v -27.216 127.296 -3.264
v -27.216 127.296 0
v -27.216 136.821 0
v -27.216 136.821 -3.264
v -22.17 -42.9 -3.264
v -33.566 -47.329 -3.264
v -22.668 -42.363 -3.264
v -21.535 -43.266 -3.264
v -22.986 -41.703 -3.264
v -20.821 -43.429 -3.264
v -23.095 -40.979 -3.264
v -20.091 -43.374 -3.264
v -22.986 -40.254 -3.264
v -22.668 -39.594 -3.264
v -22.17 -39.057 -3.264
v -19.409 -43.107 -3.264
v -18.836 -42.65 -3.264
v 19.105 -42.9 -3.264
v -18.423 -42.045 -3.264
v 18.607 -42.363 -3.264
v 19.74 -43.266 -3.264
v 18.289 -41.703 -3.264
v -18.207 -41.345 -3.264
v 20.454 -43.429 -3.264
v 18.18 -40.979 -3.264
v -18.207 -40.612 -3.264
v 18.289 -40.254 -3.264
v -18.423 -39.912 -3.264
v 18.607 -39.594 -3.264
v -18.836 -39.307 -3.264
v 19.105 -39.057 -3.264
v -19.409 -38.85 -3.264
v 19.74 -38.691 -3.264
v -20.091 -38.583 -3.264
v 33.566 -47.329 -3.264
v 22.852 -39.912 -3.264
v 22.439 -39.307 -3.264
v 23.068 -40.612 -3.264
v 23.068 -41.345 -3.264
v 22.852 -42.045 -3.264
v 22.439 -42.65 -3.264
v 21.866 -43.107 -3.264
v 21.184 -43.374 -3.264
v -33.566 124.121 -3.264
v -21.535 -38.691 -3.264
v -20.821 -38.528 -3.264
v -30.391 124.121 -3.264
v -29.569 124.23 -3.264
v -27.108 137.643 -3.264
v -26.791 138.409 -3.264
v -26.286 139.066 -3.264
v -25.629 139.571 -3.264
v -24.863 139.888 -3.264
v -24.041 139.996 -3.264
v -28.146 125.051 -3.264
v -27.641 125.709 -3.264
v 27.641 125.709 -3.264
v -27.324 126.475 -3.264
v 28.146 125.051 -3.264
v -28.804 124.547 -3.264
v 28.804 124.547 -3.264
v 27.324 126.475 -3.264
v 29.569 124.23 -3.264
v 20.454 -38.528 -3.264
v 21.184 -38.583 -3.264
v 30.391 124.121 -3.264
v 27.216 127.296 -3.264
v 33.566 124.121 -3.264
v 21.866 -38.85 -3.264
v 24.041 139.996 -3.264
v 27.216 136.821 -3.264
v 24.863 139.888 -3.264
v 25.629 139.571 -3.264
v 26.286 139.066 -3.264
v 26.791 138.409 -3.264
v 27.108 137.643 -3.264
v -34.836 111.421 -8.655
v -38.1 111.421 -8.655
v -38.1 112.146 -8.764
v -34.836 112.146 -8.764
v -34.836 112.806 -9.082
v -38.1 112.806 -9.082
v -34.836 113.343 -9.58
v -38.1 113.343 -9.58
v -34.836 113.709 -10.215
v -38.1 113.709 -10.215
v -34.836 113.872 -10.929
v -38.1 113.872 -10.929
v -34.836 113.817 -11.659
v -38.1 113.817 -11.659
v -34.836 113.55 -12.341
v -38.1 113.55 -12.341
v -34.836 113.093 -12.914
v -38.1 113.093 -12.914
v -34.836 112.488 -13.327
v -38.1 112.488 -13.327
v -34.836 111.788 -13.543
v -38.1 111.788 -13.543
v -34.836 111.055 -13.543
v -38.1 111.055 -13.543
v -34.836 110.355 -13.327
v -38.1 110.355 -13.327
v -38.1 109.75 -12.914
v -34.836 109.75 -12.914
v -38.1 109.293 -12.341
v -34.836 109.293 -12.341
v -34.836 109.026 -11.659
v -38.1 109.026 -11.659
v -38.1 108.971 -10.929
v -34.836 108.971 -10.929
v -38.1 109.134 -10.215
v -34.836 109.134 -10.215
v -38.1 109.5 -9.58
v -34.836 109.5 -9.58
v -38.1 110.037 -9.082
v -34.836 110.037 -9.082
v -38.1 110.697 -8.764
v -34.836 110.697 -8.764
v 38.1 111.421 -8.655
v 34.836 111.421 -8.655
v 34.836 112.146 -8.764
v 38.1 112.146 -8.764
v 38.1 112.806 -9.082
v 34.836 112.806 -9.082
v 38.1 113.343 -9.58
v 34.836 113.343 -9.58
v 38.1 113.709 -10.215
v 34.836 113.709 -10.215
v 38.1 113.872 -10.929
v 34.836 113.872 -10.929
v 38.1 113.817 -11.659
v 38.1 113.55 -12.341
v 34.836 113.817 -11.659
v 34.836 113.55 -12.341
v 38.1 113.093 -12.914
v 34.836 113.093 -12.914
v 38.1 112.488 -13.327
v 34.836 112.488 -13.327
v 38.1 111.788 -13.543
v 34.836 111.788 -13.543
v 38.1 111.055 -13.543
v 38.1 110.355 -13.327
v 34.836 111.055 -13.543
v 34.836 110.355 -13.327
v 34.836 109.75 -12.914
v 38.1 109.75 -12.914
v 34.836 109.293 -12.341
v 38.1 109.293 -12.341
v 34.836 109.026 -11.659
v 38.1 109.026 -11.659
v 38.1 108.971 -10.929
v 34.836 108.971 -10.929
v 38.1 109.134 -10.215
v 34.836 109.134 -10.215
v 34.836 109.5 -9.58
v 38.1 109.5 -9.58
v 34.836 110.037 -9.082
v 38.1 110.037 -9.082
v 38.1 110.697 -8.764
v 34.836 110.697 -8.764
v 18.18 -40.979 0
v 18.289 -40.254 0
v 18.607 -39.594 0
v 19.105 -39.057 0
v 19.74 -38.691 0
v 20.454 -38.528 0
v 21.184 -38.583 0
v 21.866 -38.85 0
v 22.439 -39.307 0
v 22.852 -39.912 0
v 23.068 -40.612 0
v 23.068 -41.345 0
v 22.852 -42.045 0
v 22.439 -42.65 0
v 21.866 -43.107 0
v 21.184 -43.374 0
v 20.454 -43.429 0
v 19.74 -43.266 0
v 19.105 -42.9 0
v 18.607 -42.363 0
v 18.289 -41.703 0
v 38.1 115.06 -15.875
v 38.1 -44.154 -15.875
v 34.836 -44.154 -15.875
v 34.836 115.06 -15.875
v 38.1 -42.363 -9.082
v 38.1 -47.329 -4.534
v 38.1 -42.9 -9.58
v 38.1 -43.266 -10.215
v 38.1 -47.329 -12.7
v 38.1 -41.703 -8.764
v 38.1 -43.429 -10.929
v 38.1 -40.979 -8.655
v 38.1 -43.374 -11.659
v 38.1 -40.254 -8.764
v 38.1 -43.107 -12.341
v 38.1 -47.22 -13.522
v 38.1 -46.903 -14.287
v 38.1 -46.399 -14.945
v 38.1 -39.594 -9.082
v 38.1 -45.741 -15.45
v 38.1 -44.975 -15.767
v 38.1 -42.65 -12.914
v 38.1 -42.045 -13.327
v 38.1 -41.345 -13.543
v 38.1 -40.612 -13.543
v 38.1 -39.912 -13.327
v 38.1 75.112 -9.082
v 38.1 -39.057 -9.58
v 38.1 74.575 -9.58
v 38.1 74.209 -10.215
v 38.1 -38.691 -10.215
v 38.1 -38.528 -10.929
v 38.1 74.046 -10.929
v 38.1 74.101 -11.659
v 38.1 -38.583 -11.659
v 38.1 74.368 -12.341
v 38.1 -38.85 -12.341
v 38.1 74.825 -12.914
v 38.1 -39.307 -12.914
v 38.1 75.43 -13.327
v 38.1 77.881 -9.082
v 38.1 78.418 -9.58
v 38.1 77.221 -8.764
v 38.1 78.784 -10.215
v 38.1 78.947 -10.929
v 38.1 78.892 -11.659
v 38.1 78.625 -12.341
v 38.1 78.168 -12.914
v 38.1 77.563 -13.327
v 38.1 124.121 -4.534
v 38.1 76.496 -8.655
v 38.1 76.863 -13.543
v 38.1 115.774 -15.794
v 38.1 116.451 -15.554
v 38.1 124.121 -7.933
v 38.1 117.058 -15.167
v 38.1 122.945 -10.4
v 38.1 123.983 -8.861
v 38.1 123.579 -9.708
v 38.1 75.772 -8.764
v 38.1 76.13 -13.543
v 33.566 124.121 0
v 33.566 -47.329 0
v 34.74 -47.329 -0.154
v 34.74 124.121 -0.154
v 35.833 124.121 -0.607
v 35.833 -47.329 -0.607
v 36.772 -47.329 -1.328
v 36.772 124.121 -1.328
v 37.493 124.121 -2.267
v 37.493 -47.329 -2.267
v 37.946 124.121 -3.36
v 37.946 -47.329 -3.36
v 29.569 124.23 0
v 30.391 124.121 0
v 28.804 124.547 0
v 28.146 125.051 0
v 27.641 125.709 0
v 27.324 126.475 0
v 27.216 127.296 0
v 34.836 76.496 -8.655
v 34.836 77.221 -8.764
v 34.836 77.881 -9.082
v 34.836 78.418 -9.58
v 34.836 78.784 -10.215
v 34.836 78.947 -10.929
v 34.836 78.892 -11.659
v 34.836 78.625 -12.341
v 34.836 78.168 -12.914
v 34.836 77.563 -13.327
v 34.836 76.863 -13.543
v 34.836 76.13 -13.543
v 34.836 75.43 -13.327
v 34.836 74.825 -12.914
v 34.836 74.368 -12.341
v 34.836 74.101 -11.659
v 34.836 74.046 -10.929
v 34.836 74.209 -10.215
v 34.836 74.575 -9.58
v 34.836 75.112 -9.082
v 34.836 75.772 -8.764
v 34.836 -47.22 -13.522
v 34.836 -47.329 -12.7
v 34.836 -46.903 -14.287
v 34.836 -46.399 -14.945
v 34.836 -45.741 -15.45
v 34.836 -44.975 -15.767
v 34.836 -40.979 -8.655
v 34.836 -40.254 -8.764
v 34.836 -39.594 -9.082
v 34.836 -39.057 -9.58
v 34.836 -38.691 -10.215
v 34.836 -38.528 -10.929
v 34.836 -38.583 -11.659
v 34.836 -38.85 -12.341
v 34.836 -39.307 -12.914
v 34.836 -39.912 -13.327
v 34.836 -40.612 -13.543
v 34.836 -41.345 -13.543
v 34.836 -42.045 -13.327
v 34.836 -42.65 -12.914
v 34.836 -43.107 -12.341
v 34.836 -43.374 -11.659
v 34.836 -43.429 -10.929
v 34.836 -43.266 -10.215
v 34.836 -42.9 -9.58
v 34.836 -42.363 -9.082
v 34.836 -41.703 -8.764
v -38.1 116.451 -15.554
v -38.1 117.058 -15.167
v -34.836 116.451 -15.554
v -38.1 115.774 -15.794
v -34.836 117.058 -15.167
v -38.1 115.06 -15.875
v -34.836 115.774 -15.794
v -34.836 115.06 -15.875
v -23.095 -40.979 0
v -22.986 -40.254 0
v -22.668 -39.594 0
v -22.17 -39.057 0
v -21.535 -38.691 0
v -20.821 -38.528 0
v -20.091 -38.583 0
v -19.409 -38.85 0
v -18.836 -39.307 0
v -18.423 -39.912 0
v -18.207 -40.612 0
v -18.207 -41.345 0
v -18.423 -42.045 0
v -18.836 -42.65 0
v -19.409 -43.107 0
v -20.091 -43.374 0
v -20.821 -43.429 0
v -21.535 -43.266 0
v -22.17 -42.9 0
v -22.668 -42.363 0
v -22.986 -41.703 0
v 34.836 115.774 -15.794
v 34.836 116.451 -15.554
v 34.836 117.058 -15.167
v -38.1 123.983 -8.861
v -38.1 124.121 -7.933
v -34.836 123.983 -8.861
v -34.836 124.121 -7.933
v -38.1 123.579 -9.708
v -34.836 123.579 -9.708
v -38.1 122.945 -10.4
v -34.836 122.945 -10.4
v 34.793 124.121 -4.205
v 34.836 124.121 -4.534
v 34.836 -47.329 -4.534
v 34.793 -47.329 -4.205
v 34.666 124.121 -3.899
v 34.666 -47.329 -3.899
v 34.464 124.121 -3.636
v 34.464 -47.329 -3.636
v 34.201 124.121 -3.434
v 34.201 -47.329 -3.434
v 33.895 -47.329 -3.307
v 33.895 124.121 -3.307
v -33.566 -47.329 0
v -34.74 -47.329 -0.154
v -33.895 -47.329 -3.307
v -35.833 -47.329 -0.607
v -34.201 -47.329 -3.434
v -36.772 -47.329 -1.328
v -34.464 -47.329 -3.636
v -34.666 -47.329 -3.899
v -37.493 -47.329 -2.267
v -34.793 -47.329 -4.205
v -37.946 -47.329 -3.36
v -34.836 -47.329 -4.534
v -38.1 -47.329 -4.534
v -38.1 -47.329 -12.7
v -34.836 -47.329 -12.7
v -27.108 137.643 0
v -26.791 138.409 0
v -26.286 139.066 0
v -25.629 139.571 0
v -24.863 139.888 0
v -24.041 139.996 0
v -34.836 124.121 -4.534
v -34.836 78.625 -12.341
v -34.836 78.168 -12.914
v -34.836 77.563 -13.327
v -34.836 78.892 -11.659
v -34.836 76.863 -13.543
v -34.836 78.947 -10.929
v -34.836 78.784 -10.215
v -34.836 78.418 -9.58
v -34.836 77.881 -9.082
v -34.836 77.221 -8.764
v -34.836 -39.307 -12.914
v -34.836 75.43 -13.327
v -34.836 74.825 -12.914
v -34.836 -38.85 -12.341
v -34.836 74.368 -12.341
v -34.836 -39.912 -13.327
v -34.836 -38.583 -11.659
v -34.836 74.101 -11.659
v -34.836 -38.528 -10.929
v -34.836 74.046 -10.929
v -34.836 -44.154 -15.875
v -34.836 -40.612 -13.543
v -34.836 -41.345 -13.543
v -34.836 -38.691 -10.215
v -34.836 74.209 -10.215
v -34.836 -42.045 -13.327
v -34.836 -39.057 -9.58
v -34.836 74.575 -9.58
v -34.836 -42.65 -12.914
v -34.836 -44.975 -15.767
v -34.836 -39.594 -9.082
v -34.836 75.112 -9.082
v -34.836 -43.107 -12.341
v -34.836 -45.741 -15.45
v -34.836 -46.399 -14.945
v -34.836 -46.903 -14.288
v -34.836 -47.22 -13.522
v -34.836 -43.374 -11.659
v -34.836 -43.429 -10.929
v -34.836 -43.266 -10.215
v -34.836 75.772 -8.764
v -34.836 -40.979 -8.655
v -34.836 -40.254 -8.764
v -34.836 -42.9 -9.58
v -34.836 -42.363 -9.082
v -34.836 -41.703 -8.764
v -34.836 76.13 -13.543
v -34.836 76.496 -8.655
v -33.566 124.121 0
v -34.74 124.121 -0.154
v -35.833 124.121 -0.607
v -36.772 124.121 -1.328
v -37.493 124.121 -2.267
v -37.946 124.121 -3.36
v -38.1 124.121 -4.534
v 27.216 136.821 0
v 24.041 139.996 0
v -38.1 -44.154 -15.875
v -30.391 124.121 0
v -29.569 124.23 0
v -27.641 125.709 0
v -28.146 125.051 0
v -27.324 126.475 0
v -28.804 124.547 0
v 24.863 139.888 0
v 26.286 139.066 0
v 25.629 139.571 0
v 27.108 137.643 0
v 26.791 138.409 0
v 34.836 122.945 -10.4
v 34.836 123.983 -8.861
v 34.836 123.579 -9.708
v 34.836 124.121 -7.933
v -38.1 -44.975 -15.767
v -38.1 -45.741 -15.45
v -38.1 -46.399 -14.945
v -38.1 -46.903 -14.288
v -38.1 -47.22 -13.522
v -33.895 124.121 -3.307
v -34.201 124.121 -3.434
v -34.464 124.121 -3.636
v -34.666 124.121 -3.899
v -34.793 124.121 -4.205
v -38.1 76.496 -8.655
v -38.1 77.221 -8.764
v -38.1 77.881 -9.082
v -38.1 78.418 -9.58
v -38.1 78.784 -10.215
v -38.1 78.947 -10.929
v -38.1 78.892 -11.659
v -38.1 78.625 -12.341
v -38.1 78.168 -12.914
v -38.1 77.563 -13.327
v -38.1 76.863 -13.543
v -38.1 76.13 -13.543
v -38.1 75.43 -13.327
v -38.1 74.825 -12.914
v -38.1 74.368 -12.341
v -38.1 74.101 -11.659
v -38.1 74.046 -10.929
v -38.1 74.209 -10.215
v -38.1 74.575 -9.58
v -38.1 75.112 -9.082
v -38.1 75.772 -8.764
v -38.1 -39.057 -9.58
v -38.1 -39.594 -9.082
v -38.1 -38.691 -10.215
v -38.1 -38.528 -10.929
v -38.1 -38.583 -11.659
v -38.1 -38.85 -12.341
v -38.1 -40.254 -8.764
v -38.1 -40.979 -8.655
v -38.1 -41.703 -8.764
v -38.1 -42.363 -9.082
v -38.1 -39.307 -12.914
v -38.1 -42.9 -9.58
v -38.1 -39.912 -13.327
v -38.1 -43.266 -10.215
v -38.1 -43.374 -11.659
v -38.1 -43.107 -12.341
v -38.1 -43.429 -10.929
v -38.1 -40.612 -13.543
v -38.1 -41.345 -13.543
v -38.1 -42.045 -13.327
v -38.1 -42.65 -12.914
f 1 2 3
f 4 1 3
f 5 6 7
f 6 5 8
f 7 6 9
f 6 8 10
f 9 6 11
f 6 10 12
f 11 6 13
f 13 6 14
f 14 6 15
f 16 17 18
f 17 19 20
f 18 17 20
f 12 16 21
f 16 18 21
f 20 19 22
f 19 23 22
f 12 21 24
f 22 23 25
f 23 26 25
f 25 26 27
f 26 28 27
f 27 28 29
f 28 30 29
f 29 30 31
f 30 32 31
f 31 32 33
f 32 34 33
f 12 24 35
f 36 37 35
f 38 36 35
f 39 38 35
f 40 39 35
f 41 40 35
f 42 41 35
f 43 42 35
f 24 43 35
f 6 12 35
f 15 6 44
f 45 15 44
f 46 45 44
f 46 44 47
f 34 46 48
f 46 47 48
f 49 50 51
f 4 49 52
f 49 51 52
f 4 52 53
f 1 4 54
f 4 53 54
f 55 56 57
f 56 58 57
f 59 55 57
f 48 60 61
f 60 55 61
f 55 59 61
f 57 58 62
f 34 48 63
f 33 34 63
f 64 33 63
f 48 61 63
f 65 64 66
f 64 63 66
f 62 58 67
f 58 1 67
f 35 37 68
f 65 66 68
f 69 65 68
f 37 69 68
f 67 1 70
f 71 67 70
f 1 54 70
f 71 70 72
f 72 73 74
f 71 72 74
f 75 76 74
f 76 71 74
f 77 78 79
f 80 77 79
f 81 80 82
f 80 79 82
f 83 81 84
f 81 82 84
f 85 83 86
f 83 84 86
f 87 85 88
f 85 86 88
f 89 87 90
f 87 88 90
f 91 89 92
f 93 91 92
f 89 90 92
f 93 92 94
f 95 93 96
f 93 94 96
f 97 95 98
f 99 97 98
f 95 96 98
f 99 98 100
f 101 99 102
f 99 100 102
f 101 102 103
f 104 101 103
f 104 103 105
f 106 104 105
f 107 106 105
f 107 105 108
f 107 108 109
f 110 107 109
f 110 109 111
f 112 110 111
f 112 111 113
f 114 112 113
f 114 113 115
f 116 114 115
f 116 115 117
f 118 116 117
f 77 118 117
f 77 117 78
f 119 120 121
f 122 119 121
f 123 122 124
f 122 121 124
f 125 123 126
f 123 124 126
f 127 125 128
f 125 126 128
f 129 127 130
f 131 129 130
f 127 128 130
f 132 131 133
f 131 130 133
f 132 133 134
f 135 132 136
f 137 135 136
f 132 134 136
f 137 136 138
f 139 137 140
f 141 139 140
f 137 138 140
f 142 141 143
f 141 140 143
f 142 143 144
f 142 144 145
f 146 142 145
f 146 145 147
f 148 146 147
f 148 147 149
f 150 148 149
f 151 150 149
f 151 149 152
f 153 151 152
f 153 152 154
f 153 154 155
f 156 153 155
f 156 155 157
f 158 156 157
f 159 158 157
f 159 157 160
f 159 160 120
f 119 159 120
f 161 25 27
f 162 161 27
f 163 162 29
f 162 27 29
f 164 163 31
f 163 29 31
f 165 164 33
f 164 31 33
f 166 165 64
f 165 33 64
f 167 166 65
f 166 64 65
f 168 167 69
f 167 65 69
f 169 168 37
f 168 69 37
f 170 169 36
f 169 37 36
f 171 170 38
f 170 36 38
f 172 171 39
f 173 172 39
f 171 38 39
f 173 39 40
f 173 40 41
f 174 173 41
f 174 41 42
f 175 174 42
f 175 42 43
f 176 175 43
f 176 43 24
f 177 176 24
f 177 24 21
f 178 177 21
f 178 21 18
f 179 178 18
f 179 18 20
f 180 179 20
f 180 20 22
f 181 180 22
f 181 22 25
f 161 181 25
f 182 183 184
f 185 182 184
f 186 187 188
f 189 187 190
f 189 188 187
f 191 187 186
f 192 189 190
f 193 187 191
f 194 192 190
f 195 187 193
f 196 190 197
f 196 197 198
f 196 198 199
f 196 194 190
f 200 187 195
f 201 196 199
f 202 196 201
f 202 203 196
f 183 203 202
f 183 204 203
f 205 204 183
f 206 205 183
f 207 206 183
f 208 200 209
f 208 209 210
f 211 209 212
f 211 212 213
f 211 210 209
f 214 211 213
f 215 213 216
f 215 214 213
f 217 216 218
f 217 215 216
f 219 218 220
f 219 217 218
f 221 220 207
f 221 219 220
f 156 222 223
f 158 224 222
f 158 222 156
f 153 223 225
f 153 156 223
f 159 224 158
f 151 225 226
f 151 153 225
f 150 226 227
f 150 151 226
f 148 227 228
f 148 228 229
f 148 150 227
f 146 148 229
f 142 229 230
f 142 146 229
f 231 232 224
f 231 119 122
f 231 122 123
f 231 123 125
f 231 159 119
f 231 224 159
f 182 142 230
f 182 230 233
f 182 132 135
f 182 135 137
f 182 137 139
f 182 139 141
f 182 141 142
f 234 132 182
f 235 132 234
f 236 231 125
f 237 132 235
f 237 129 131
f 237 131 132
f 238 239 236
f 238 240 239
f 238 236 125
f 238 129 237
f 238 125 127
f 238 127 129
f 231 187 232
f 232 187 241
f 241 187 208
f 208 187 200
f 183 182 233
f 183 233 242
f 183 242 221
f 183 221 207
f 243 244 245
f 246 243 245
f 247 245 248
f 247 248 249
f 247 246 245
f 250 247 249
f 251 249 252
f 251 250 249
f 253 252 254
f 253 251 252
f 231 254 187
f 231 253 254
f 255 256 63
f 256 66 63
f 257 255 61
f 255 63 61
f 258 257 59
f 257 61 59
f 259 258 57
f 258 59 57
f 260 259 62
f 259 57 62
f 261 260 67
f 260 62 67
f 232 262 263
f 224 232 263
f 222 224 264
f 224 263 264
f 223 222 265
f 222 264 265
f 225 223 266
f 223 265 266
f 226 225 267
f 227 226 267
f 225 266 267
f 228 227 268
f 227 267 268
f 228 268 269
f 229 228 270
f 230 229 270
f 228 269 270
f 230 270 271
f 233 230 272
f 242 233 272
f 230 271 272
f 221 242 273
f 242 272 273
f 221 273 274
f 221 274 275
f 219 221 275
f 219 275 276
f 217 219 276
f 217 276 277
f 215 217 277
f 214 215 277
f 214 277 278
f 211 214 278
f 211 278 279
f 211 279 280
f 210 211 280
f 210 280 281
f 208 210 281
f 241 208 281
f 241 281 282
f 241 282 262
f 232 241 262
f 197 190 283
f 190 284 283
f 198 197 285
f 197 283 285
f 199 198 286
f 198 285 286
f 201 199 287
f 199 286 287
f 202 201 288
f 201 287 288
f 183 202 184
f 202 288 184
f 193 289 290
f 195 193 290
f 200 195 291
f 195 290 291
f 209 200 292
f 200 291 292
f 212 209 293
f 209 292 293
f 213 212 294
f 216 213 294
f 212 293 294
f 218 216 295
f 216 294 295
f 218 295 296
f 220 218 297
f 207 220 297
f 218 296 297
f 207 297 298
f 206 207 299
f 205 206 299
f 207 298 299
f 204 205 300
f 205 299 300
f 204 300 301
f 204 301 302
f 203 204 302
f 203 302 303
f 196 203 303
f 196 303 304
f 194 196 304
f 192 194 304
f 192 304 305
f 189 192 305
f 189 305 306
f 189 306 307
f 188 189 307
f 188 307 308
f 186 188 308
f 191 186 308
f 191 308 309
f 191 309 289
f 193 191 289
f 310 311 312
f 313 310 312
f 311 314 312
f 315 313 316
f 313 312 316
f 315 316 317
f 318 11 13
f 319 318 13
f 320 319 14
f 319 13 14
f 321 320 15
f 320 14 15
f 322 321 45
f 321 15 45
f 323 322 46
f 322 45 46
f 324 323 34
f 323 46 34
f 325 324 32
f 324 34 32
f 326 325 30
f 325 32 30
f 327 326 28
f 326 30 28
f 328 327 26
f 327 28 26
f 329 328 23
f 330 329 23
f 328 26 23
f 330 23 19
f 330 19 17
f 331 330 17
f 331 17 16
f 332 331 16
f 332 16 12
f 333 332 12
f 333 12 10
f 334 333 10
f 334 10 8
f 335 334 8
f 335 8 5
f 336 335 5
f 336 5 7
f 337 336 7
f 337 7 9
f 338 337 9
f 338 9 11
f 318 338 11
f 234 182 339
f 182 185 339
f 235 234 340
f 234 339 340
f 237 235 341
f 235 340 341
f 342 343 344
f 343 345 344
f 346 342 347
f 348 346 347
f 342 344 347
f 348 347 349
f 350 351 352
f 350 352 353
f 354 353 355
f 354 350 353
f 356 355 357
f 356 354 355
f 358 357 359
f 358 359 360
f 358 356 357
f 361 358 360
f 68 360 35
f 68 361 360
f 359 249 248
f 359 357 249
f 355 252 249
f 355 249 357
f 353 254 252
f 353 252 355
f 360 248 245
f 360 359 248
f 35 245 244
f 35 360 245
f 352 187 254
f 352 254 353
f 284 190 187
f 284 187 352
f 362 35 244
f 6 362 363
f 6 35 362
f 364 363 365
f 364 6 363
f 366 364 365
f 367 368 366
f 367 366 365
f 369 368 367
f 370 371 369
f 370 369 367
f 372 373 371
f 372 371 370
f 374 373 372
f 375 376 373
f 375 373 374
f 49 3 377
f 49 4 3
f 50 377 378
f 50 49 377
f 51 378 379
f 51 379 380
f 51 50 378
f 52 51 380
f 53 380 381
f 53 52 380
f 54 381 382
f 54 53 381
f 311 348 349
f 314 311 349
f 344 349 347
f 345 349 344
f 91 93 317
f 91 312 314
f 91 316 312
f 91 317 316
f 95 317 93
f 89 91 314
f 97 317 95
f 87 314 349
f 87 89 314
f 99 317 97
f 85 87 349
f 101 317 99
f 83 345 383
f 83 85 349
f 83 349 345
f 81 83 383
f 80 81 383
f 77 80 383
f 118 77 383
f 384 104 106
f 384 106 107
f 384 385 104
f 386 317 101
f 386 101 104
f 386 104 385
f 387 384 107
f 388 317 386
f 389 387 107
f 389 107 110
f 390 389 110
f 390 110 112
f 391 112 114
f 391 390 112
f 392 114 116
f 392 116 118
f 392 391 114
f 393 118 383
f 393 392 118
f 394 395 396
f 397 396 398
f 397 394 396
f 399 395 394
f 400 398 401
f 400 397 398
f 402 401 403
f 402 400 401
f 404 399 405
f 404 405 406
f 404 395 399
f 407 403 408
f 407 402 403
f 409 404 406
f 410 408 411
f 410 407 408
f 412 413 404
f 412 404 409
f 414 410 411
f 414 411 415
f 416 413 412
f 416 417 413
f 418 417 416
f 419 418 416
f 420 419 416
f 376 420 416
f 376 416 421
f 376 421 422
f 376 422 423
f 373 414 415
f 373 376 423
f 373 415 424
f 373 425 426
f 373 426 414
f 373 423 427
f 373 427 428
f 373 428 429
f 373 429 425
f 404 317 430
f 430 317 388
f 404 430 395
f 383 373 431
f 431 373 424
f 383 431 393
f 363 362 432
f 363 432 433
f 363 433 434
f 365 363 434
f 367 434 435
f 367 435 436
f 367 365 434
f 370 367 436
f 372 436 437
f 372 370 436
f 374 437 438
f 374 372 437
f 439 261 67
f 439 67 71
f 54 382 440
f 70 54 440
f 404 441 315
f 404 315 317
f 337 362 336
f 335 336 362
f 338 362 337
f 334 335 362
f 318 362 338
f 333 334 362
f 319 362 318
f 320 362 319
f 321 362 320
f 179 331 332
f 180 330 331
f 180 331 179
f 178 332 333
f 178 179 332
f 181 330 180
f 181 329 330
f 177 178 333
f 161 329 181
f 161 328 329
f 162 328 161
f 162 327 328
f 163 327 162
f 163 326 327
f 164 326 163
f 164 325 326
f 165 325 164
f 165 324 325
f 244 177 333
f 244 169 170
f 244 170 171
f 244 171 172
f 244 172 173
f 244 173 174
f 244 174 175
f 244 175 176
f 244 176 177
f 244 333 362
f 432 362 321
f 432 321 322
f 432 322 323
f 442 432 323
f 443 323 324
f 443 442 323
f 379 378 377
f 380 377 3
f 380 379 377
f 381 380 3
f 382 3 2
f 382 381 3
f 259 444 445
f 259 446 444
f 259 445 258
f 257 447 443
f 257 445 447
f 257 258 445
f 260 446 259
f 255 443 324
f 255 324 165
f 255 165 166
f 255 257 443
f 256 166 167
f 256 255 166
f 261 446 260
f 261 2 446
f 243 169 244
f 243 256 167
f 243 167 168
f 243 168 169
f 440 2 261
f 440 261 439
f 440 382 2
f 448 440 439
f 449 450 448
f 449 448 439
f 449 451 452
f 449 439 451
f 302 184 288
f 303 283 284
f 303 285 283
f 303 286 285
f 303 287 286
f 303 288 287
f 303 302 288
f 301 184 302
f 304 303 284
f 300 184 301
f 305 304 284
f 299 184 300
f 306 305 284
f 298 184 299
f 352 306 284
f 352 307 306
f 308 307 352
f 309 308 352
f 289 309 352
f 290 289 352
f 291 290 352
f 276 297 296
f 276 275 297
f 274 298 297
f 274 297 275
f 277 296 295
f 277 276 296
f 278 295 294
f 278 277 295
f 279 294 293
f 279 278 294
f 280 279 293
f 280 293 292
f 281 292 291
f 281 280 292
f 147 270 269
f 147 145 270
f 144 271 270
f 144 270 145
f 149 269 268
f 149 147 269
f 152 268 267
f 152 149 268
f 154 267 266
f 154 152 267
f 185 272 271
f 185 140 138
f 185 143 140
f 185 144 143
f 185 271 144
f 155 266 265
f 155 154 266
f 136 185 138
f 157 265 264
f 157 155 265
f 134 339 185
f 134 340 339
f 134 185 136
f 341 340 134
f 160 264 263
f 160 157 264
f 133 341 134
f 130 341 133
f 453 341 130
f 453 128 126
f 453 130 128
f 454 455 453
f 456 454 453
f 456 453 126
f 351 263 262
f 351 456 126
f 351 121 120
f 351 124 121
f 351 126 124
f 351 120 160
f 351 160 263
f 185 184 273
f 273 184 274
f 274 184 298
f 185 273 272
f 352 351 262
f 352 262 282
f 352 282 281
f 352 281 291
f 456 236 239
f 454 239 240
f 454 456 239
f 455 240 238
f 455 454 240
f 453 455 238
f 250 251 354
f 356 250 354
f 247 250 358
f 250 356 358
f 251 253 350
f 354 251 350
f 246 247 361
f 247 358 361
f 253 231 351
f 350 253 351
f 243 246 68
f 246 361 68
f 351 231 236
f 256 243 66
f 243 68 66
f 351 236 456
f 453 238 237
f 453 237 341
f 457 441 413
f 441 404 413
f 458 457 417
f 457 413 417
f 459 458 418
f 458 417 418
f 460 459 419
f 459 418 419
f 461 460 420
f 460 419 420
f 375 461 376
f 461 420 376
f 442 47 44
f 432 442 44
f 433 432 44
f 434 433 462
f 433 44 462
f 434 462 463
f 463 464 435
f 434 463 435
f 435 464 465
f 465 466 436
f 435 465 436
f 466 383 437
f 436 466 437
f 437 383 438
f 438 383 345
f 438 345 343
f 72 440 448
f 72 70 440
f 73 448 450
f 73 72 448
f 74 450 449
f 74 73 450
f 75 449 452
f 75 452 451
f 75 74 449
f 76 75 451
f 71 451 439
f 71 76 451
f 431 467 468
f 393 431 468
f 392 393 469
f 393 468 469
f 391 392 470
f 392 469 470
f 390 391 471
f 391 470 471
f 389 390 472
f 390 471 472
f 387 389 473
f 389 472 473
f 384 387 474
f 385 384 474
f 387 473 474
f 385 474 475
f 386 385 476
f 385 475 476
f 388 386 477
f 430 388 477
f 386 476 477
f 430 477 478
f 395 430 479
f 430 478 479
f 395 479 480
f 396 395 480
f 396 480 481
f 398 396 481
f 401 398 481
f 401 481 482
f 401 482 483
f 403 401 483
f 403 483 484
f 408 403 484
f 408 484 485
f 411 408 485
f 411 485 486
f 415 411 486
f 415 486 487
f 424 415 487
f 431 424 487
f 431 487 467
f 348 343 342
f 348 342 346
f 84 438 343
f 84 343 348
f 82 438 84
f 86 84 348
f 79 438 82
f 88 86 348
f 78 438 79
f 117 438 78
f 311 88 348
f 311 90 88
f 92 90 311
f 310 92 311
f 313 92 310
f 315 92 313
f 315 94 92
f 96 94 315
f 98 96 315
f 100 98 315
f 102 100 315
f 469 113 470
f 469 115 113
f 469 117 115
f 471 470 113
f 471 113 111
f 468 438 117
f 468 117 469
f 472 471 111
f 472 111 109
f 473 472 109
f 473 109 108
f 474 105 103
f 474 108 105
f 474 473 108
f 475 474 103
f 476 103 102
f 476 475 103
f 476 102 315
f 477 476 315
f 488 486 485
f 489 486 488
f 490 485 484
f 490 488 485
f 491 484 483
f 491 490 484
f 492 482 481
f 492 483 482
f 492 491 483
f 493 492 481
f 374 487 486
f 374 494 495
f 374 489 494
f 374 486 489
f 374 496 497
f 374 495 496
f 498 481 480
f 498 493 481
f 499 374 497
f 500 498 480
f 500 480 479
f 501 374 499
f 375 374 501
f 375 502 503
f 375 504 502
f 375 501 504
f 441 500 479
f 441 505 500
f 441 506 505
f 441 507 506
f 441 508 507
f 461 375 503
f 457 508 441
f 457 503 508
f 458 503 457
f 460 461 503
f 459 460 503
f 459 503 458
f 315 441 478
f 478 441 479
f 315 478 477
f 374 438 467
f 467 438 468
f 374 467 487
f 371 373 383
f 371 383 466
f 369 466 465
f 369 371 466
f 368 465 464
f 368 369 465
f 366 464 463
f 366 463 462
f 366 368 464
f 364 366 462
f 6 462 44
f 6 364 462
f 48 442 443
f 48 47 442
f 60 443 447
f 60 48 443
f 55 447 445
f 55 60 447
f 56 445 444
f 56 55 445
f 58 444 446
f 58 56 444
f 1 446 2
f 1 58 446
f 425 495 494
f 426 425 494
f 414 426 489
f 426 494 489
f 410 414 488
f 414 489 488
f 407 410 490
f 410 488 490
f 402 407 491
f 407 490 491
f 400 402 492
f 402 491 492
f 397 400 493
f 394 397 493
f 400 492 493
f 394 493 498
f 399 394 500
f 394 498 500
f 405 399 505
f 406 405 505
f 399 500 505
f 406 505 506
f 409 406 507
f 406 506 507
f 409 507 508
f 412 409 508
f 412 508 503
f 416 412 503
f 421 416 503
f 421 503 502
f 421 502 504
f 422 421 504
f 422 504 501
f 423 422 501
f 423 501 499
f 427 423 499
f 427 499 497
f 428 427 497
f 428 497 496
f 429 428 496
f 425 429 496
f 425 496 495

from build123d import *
from OCP.BRepFilletAPI import BRepFilletAPI_MakeChamfer

# Parameters (mm, degrees)
SKETCH1_W                      = 76.2
SKETCH1_H                      = 171.45
BASE_FLANGE1_DEPTH             = 3.2639
EDGE_FLANGE1_STRIP_W           = 15.5956
EDGE_FLANGE1_STRIP_H           = 3.2639
EDGE_FLANGE1_STRIP_CUT_DEPTH   = 171.45
EDGE_FLANGE1_STRIP_2_W         = 15.5956
EDGE_FLANGE1_STRIP_2_H         = 3.2639
EDGE_FLANGE1_STRIP_CUT_2_DEPTH = 171.45
EDGE_FLANGE1_DEPTH             = 171.45
EDGE_FLANGE1_BEND_DEPTH        = 171.45
F_10_0_1935_DIAMETER_HOLE1_D   = 4.9149
SKETCH33_W                     = 54.4322
SKETCH33_H                     = 15.875
BOSS_EXTRUDE1_DEPTH            = 3.2639
CHAMFER1_SIZE                  = 7.9375
CHAMFER1_SIZE2                 = 6.427660763
F_10_0_1935_DIAMETER_HOLE2_D   = 4.9149
FILLET1_R                      = 3.175


# Sheet-metal steps are written as plain solids
with BuildPart() as part:
    # Sketch1 → Base-Flange1 (new body)
    with BuildSketch(Plane.XY):
        with Locations((0, 38.396418)):
            Rectangle(SKETCH1_W, SKETCH1_H)
    extrude(amount=-BASE_FLANGE1_DEPTH)

    # Edge-Flange1 strip (across the edge) → Edge-Flange1 strip cut (cut)
    with BuildSketch(Plane(origin=(38.1, 124.121418, -3.2639), x_dir=(-1, 0, 0), z_dir=(0, -1, 0))):
        with Locations((-3.2639, -1.63195)):
            Rectangle(EDGE_FLANGE1_STRIP_W, EDGE_FLANGE1_STRIP_H)
    extrude(amount=EDGE_FLANGE1_STRIP_CUT_DEPTH, mode=Mode.SUBTRACT)

    # Edge-Flange1 strip 2 (across the edge) → Edge-Flange1 strip cut 2 (cut)
    with BuildSketch(Plane(origin=(-38.1, -47.328582, -3.2639), x_dir=(1, 0, 0), z_dir=(0, 1, 0))):
        with Locations((-3.2639, -1.63195)):
            Rectangle(EDGE_FLANGE1_STRIP_2_W, EDGE_FLANGE1_STRIP_2_H)
    extrude(amount=EDGE_FLANGE1_STRIP_CUT_2_DEPTH, mode=Mode.SUBTRACT)

    # Edge-Flange1 section (across the edge) → Edge-Flange1 (add)
    with BuildSketch(Plane(origin=(38.1, 124.121418, -3.2639), x_dir=(-1, 0, 0), z_dir=(0, -1, 0))):
        with BuildLine():
            Line((0, 1.27), (0, 12.6111))
            Line((0, 12.6111), (3.2639, 12.6111))
            Line((3.2639, 12.6111), (3.2639, 1.27))
            ThreePointArc((3.2639, 1.27), (3.635874388, 0.371974388), (4.5339, 0))
            Line((4.5339, 0), (4.5339, -3.2639))
            ThreePointArc((4.5339, -3.2639), (1.327948565, -1.935951435), (0, 1.27))
        make_face()
    extrude(amount=EDGE_FLANGE1_DEPTH)

    # Edge-Flange1 section 2 (across the edge) → Edge-Flange1 bend (add)
    with BuildSketch(Plane(origin=(-38.1, -47.328582, -3.2639), x_dir=(1, 0, 0), z_dir=(0, 1, 0))):
        with BuildLine():
            Line((0, 1.27), (0, 12.6111))
            Line((0, 12.6111), (3.2639, 12.6111))
            Line((3.2639, 12.6111), (3.2639, 1.27))
            ThreePointArc((3.2639, 1.27), (3.635874388, 0.371974388), (4.5339, 0))
            Line((4.5339, 0), (4.5339, -3.2639))
            ThreePointArc((4.5339, -3.2639), (1.327948565, -1.935951435), (0, 1.27))
        make_face()
    extrude(amount=EDGE_FLANGE1_BEND_DEPTH)

    # #10 (0.1935) Diameter Hole1 (through all)
    with Locations(Plane(origin=(38.1, 0, 0), x_dir=(0, 0, -1), z_dir=(1, 0, 0))):
        with Locations((11.1125, 76.496418), (11.1125, -40.978582), (11.1125, 111.421418)):
            Hole(F_10_0_1935_DIAMETER_HOLE1_D / 2)

    # Sketch33 → Boss-Extrude1 (add)
    with BuildSketch(Plane.XY):
        with Locations((0, 132.058918)):
            Rectangle(SKETCH33_W, SKETCH33_H)
    extrude(amount=-BOSS_EXTRUDE1_DEPTH)

    # Chamfer1: one chamfer whose edges measure the first distance from different faces: ONE call of the kernel's chamfer builder (chamfer() names one face for all edges)
    chamfer1_edges_1 = [part.edges().sort_by_distance(p)[0] for p in [
        (36.46805, 124.121418, -15.875),
    ]]
    chamfer1_side_1 = [part.faces().sort_by_distance(p)[0] for p in [
        (36.46805, 38.396418, -15.875),
    ]]
    chamfer1_edges_2 = [part.edges().sort_by_distance(p)[0] for p in [
        (-36.46805, 124.121418, -15.875),
    ]]
    chamfer1_side_2 = [part.faces().sort_by_distance(p)[0] for p in [
        (-36.46805, 38.396418, -15.875),
    ]]
    chamfer1 = BRepFilletAPI_MakeChamfer(part.part.solid().wrapped)
    for e in chamfer1_edges_1:
        chamfer1.Add(CHAMFER1_SIZE, CHAMFER1_SIZE2, e.wrapped, chamfer1_side_1[0].wrapped)  # the first distance lies on this face
    for e in chamfer1_edges_2:
        chamfer1.Add(CHAMFER1_SIZE, CHAMFER1_SIZE2, e.wrapped, chamfer1_side_2[0].wrapped)  # the first distance lies on this face
    add(Compound.cast(chamfer1.Shape()), mode=Mode.REPLACE)

    # #10 (0.1935) Diameter Hole2 (through all)
    with Locations(Plane.XY):
        with Locations((-20.6375, -40.978582), (20.6375, -40.978582)):
            Hole(F_10_0_1935_DIAMETER_HOLE2_D / 2)

    # Fillet1
    fillet1_edges = [part.edges().sort_by_distance(p)[0] for p in [
        (-27.2161, 124.121418, -1.63195),
        (-27.2161, 139.996418, -1.63195),
        (27.2161, 139.996418, -1.63195),
        (27.2161, 124.121418, -1.63195),
        (-36.46805, 116.183918, -15.875),
        (-36.46805, 124.121418, -9.447339237),
        (36.46805, 124.121418, -9.447339237),
        (36.46805, 116.183918, -15.875),
        (36.46805, -47.328582, -15.875),
        (-36.46805, -47.328582, -15.875),
    ]]
    fillet(fillet1_edges, radius=FILLET1_R)


solid = part.part
